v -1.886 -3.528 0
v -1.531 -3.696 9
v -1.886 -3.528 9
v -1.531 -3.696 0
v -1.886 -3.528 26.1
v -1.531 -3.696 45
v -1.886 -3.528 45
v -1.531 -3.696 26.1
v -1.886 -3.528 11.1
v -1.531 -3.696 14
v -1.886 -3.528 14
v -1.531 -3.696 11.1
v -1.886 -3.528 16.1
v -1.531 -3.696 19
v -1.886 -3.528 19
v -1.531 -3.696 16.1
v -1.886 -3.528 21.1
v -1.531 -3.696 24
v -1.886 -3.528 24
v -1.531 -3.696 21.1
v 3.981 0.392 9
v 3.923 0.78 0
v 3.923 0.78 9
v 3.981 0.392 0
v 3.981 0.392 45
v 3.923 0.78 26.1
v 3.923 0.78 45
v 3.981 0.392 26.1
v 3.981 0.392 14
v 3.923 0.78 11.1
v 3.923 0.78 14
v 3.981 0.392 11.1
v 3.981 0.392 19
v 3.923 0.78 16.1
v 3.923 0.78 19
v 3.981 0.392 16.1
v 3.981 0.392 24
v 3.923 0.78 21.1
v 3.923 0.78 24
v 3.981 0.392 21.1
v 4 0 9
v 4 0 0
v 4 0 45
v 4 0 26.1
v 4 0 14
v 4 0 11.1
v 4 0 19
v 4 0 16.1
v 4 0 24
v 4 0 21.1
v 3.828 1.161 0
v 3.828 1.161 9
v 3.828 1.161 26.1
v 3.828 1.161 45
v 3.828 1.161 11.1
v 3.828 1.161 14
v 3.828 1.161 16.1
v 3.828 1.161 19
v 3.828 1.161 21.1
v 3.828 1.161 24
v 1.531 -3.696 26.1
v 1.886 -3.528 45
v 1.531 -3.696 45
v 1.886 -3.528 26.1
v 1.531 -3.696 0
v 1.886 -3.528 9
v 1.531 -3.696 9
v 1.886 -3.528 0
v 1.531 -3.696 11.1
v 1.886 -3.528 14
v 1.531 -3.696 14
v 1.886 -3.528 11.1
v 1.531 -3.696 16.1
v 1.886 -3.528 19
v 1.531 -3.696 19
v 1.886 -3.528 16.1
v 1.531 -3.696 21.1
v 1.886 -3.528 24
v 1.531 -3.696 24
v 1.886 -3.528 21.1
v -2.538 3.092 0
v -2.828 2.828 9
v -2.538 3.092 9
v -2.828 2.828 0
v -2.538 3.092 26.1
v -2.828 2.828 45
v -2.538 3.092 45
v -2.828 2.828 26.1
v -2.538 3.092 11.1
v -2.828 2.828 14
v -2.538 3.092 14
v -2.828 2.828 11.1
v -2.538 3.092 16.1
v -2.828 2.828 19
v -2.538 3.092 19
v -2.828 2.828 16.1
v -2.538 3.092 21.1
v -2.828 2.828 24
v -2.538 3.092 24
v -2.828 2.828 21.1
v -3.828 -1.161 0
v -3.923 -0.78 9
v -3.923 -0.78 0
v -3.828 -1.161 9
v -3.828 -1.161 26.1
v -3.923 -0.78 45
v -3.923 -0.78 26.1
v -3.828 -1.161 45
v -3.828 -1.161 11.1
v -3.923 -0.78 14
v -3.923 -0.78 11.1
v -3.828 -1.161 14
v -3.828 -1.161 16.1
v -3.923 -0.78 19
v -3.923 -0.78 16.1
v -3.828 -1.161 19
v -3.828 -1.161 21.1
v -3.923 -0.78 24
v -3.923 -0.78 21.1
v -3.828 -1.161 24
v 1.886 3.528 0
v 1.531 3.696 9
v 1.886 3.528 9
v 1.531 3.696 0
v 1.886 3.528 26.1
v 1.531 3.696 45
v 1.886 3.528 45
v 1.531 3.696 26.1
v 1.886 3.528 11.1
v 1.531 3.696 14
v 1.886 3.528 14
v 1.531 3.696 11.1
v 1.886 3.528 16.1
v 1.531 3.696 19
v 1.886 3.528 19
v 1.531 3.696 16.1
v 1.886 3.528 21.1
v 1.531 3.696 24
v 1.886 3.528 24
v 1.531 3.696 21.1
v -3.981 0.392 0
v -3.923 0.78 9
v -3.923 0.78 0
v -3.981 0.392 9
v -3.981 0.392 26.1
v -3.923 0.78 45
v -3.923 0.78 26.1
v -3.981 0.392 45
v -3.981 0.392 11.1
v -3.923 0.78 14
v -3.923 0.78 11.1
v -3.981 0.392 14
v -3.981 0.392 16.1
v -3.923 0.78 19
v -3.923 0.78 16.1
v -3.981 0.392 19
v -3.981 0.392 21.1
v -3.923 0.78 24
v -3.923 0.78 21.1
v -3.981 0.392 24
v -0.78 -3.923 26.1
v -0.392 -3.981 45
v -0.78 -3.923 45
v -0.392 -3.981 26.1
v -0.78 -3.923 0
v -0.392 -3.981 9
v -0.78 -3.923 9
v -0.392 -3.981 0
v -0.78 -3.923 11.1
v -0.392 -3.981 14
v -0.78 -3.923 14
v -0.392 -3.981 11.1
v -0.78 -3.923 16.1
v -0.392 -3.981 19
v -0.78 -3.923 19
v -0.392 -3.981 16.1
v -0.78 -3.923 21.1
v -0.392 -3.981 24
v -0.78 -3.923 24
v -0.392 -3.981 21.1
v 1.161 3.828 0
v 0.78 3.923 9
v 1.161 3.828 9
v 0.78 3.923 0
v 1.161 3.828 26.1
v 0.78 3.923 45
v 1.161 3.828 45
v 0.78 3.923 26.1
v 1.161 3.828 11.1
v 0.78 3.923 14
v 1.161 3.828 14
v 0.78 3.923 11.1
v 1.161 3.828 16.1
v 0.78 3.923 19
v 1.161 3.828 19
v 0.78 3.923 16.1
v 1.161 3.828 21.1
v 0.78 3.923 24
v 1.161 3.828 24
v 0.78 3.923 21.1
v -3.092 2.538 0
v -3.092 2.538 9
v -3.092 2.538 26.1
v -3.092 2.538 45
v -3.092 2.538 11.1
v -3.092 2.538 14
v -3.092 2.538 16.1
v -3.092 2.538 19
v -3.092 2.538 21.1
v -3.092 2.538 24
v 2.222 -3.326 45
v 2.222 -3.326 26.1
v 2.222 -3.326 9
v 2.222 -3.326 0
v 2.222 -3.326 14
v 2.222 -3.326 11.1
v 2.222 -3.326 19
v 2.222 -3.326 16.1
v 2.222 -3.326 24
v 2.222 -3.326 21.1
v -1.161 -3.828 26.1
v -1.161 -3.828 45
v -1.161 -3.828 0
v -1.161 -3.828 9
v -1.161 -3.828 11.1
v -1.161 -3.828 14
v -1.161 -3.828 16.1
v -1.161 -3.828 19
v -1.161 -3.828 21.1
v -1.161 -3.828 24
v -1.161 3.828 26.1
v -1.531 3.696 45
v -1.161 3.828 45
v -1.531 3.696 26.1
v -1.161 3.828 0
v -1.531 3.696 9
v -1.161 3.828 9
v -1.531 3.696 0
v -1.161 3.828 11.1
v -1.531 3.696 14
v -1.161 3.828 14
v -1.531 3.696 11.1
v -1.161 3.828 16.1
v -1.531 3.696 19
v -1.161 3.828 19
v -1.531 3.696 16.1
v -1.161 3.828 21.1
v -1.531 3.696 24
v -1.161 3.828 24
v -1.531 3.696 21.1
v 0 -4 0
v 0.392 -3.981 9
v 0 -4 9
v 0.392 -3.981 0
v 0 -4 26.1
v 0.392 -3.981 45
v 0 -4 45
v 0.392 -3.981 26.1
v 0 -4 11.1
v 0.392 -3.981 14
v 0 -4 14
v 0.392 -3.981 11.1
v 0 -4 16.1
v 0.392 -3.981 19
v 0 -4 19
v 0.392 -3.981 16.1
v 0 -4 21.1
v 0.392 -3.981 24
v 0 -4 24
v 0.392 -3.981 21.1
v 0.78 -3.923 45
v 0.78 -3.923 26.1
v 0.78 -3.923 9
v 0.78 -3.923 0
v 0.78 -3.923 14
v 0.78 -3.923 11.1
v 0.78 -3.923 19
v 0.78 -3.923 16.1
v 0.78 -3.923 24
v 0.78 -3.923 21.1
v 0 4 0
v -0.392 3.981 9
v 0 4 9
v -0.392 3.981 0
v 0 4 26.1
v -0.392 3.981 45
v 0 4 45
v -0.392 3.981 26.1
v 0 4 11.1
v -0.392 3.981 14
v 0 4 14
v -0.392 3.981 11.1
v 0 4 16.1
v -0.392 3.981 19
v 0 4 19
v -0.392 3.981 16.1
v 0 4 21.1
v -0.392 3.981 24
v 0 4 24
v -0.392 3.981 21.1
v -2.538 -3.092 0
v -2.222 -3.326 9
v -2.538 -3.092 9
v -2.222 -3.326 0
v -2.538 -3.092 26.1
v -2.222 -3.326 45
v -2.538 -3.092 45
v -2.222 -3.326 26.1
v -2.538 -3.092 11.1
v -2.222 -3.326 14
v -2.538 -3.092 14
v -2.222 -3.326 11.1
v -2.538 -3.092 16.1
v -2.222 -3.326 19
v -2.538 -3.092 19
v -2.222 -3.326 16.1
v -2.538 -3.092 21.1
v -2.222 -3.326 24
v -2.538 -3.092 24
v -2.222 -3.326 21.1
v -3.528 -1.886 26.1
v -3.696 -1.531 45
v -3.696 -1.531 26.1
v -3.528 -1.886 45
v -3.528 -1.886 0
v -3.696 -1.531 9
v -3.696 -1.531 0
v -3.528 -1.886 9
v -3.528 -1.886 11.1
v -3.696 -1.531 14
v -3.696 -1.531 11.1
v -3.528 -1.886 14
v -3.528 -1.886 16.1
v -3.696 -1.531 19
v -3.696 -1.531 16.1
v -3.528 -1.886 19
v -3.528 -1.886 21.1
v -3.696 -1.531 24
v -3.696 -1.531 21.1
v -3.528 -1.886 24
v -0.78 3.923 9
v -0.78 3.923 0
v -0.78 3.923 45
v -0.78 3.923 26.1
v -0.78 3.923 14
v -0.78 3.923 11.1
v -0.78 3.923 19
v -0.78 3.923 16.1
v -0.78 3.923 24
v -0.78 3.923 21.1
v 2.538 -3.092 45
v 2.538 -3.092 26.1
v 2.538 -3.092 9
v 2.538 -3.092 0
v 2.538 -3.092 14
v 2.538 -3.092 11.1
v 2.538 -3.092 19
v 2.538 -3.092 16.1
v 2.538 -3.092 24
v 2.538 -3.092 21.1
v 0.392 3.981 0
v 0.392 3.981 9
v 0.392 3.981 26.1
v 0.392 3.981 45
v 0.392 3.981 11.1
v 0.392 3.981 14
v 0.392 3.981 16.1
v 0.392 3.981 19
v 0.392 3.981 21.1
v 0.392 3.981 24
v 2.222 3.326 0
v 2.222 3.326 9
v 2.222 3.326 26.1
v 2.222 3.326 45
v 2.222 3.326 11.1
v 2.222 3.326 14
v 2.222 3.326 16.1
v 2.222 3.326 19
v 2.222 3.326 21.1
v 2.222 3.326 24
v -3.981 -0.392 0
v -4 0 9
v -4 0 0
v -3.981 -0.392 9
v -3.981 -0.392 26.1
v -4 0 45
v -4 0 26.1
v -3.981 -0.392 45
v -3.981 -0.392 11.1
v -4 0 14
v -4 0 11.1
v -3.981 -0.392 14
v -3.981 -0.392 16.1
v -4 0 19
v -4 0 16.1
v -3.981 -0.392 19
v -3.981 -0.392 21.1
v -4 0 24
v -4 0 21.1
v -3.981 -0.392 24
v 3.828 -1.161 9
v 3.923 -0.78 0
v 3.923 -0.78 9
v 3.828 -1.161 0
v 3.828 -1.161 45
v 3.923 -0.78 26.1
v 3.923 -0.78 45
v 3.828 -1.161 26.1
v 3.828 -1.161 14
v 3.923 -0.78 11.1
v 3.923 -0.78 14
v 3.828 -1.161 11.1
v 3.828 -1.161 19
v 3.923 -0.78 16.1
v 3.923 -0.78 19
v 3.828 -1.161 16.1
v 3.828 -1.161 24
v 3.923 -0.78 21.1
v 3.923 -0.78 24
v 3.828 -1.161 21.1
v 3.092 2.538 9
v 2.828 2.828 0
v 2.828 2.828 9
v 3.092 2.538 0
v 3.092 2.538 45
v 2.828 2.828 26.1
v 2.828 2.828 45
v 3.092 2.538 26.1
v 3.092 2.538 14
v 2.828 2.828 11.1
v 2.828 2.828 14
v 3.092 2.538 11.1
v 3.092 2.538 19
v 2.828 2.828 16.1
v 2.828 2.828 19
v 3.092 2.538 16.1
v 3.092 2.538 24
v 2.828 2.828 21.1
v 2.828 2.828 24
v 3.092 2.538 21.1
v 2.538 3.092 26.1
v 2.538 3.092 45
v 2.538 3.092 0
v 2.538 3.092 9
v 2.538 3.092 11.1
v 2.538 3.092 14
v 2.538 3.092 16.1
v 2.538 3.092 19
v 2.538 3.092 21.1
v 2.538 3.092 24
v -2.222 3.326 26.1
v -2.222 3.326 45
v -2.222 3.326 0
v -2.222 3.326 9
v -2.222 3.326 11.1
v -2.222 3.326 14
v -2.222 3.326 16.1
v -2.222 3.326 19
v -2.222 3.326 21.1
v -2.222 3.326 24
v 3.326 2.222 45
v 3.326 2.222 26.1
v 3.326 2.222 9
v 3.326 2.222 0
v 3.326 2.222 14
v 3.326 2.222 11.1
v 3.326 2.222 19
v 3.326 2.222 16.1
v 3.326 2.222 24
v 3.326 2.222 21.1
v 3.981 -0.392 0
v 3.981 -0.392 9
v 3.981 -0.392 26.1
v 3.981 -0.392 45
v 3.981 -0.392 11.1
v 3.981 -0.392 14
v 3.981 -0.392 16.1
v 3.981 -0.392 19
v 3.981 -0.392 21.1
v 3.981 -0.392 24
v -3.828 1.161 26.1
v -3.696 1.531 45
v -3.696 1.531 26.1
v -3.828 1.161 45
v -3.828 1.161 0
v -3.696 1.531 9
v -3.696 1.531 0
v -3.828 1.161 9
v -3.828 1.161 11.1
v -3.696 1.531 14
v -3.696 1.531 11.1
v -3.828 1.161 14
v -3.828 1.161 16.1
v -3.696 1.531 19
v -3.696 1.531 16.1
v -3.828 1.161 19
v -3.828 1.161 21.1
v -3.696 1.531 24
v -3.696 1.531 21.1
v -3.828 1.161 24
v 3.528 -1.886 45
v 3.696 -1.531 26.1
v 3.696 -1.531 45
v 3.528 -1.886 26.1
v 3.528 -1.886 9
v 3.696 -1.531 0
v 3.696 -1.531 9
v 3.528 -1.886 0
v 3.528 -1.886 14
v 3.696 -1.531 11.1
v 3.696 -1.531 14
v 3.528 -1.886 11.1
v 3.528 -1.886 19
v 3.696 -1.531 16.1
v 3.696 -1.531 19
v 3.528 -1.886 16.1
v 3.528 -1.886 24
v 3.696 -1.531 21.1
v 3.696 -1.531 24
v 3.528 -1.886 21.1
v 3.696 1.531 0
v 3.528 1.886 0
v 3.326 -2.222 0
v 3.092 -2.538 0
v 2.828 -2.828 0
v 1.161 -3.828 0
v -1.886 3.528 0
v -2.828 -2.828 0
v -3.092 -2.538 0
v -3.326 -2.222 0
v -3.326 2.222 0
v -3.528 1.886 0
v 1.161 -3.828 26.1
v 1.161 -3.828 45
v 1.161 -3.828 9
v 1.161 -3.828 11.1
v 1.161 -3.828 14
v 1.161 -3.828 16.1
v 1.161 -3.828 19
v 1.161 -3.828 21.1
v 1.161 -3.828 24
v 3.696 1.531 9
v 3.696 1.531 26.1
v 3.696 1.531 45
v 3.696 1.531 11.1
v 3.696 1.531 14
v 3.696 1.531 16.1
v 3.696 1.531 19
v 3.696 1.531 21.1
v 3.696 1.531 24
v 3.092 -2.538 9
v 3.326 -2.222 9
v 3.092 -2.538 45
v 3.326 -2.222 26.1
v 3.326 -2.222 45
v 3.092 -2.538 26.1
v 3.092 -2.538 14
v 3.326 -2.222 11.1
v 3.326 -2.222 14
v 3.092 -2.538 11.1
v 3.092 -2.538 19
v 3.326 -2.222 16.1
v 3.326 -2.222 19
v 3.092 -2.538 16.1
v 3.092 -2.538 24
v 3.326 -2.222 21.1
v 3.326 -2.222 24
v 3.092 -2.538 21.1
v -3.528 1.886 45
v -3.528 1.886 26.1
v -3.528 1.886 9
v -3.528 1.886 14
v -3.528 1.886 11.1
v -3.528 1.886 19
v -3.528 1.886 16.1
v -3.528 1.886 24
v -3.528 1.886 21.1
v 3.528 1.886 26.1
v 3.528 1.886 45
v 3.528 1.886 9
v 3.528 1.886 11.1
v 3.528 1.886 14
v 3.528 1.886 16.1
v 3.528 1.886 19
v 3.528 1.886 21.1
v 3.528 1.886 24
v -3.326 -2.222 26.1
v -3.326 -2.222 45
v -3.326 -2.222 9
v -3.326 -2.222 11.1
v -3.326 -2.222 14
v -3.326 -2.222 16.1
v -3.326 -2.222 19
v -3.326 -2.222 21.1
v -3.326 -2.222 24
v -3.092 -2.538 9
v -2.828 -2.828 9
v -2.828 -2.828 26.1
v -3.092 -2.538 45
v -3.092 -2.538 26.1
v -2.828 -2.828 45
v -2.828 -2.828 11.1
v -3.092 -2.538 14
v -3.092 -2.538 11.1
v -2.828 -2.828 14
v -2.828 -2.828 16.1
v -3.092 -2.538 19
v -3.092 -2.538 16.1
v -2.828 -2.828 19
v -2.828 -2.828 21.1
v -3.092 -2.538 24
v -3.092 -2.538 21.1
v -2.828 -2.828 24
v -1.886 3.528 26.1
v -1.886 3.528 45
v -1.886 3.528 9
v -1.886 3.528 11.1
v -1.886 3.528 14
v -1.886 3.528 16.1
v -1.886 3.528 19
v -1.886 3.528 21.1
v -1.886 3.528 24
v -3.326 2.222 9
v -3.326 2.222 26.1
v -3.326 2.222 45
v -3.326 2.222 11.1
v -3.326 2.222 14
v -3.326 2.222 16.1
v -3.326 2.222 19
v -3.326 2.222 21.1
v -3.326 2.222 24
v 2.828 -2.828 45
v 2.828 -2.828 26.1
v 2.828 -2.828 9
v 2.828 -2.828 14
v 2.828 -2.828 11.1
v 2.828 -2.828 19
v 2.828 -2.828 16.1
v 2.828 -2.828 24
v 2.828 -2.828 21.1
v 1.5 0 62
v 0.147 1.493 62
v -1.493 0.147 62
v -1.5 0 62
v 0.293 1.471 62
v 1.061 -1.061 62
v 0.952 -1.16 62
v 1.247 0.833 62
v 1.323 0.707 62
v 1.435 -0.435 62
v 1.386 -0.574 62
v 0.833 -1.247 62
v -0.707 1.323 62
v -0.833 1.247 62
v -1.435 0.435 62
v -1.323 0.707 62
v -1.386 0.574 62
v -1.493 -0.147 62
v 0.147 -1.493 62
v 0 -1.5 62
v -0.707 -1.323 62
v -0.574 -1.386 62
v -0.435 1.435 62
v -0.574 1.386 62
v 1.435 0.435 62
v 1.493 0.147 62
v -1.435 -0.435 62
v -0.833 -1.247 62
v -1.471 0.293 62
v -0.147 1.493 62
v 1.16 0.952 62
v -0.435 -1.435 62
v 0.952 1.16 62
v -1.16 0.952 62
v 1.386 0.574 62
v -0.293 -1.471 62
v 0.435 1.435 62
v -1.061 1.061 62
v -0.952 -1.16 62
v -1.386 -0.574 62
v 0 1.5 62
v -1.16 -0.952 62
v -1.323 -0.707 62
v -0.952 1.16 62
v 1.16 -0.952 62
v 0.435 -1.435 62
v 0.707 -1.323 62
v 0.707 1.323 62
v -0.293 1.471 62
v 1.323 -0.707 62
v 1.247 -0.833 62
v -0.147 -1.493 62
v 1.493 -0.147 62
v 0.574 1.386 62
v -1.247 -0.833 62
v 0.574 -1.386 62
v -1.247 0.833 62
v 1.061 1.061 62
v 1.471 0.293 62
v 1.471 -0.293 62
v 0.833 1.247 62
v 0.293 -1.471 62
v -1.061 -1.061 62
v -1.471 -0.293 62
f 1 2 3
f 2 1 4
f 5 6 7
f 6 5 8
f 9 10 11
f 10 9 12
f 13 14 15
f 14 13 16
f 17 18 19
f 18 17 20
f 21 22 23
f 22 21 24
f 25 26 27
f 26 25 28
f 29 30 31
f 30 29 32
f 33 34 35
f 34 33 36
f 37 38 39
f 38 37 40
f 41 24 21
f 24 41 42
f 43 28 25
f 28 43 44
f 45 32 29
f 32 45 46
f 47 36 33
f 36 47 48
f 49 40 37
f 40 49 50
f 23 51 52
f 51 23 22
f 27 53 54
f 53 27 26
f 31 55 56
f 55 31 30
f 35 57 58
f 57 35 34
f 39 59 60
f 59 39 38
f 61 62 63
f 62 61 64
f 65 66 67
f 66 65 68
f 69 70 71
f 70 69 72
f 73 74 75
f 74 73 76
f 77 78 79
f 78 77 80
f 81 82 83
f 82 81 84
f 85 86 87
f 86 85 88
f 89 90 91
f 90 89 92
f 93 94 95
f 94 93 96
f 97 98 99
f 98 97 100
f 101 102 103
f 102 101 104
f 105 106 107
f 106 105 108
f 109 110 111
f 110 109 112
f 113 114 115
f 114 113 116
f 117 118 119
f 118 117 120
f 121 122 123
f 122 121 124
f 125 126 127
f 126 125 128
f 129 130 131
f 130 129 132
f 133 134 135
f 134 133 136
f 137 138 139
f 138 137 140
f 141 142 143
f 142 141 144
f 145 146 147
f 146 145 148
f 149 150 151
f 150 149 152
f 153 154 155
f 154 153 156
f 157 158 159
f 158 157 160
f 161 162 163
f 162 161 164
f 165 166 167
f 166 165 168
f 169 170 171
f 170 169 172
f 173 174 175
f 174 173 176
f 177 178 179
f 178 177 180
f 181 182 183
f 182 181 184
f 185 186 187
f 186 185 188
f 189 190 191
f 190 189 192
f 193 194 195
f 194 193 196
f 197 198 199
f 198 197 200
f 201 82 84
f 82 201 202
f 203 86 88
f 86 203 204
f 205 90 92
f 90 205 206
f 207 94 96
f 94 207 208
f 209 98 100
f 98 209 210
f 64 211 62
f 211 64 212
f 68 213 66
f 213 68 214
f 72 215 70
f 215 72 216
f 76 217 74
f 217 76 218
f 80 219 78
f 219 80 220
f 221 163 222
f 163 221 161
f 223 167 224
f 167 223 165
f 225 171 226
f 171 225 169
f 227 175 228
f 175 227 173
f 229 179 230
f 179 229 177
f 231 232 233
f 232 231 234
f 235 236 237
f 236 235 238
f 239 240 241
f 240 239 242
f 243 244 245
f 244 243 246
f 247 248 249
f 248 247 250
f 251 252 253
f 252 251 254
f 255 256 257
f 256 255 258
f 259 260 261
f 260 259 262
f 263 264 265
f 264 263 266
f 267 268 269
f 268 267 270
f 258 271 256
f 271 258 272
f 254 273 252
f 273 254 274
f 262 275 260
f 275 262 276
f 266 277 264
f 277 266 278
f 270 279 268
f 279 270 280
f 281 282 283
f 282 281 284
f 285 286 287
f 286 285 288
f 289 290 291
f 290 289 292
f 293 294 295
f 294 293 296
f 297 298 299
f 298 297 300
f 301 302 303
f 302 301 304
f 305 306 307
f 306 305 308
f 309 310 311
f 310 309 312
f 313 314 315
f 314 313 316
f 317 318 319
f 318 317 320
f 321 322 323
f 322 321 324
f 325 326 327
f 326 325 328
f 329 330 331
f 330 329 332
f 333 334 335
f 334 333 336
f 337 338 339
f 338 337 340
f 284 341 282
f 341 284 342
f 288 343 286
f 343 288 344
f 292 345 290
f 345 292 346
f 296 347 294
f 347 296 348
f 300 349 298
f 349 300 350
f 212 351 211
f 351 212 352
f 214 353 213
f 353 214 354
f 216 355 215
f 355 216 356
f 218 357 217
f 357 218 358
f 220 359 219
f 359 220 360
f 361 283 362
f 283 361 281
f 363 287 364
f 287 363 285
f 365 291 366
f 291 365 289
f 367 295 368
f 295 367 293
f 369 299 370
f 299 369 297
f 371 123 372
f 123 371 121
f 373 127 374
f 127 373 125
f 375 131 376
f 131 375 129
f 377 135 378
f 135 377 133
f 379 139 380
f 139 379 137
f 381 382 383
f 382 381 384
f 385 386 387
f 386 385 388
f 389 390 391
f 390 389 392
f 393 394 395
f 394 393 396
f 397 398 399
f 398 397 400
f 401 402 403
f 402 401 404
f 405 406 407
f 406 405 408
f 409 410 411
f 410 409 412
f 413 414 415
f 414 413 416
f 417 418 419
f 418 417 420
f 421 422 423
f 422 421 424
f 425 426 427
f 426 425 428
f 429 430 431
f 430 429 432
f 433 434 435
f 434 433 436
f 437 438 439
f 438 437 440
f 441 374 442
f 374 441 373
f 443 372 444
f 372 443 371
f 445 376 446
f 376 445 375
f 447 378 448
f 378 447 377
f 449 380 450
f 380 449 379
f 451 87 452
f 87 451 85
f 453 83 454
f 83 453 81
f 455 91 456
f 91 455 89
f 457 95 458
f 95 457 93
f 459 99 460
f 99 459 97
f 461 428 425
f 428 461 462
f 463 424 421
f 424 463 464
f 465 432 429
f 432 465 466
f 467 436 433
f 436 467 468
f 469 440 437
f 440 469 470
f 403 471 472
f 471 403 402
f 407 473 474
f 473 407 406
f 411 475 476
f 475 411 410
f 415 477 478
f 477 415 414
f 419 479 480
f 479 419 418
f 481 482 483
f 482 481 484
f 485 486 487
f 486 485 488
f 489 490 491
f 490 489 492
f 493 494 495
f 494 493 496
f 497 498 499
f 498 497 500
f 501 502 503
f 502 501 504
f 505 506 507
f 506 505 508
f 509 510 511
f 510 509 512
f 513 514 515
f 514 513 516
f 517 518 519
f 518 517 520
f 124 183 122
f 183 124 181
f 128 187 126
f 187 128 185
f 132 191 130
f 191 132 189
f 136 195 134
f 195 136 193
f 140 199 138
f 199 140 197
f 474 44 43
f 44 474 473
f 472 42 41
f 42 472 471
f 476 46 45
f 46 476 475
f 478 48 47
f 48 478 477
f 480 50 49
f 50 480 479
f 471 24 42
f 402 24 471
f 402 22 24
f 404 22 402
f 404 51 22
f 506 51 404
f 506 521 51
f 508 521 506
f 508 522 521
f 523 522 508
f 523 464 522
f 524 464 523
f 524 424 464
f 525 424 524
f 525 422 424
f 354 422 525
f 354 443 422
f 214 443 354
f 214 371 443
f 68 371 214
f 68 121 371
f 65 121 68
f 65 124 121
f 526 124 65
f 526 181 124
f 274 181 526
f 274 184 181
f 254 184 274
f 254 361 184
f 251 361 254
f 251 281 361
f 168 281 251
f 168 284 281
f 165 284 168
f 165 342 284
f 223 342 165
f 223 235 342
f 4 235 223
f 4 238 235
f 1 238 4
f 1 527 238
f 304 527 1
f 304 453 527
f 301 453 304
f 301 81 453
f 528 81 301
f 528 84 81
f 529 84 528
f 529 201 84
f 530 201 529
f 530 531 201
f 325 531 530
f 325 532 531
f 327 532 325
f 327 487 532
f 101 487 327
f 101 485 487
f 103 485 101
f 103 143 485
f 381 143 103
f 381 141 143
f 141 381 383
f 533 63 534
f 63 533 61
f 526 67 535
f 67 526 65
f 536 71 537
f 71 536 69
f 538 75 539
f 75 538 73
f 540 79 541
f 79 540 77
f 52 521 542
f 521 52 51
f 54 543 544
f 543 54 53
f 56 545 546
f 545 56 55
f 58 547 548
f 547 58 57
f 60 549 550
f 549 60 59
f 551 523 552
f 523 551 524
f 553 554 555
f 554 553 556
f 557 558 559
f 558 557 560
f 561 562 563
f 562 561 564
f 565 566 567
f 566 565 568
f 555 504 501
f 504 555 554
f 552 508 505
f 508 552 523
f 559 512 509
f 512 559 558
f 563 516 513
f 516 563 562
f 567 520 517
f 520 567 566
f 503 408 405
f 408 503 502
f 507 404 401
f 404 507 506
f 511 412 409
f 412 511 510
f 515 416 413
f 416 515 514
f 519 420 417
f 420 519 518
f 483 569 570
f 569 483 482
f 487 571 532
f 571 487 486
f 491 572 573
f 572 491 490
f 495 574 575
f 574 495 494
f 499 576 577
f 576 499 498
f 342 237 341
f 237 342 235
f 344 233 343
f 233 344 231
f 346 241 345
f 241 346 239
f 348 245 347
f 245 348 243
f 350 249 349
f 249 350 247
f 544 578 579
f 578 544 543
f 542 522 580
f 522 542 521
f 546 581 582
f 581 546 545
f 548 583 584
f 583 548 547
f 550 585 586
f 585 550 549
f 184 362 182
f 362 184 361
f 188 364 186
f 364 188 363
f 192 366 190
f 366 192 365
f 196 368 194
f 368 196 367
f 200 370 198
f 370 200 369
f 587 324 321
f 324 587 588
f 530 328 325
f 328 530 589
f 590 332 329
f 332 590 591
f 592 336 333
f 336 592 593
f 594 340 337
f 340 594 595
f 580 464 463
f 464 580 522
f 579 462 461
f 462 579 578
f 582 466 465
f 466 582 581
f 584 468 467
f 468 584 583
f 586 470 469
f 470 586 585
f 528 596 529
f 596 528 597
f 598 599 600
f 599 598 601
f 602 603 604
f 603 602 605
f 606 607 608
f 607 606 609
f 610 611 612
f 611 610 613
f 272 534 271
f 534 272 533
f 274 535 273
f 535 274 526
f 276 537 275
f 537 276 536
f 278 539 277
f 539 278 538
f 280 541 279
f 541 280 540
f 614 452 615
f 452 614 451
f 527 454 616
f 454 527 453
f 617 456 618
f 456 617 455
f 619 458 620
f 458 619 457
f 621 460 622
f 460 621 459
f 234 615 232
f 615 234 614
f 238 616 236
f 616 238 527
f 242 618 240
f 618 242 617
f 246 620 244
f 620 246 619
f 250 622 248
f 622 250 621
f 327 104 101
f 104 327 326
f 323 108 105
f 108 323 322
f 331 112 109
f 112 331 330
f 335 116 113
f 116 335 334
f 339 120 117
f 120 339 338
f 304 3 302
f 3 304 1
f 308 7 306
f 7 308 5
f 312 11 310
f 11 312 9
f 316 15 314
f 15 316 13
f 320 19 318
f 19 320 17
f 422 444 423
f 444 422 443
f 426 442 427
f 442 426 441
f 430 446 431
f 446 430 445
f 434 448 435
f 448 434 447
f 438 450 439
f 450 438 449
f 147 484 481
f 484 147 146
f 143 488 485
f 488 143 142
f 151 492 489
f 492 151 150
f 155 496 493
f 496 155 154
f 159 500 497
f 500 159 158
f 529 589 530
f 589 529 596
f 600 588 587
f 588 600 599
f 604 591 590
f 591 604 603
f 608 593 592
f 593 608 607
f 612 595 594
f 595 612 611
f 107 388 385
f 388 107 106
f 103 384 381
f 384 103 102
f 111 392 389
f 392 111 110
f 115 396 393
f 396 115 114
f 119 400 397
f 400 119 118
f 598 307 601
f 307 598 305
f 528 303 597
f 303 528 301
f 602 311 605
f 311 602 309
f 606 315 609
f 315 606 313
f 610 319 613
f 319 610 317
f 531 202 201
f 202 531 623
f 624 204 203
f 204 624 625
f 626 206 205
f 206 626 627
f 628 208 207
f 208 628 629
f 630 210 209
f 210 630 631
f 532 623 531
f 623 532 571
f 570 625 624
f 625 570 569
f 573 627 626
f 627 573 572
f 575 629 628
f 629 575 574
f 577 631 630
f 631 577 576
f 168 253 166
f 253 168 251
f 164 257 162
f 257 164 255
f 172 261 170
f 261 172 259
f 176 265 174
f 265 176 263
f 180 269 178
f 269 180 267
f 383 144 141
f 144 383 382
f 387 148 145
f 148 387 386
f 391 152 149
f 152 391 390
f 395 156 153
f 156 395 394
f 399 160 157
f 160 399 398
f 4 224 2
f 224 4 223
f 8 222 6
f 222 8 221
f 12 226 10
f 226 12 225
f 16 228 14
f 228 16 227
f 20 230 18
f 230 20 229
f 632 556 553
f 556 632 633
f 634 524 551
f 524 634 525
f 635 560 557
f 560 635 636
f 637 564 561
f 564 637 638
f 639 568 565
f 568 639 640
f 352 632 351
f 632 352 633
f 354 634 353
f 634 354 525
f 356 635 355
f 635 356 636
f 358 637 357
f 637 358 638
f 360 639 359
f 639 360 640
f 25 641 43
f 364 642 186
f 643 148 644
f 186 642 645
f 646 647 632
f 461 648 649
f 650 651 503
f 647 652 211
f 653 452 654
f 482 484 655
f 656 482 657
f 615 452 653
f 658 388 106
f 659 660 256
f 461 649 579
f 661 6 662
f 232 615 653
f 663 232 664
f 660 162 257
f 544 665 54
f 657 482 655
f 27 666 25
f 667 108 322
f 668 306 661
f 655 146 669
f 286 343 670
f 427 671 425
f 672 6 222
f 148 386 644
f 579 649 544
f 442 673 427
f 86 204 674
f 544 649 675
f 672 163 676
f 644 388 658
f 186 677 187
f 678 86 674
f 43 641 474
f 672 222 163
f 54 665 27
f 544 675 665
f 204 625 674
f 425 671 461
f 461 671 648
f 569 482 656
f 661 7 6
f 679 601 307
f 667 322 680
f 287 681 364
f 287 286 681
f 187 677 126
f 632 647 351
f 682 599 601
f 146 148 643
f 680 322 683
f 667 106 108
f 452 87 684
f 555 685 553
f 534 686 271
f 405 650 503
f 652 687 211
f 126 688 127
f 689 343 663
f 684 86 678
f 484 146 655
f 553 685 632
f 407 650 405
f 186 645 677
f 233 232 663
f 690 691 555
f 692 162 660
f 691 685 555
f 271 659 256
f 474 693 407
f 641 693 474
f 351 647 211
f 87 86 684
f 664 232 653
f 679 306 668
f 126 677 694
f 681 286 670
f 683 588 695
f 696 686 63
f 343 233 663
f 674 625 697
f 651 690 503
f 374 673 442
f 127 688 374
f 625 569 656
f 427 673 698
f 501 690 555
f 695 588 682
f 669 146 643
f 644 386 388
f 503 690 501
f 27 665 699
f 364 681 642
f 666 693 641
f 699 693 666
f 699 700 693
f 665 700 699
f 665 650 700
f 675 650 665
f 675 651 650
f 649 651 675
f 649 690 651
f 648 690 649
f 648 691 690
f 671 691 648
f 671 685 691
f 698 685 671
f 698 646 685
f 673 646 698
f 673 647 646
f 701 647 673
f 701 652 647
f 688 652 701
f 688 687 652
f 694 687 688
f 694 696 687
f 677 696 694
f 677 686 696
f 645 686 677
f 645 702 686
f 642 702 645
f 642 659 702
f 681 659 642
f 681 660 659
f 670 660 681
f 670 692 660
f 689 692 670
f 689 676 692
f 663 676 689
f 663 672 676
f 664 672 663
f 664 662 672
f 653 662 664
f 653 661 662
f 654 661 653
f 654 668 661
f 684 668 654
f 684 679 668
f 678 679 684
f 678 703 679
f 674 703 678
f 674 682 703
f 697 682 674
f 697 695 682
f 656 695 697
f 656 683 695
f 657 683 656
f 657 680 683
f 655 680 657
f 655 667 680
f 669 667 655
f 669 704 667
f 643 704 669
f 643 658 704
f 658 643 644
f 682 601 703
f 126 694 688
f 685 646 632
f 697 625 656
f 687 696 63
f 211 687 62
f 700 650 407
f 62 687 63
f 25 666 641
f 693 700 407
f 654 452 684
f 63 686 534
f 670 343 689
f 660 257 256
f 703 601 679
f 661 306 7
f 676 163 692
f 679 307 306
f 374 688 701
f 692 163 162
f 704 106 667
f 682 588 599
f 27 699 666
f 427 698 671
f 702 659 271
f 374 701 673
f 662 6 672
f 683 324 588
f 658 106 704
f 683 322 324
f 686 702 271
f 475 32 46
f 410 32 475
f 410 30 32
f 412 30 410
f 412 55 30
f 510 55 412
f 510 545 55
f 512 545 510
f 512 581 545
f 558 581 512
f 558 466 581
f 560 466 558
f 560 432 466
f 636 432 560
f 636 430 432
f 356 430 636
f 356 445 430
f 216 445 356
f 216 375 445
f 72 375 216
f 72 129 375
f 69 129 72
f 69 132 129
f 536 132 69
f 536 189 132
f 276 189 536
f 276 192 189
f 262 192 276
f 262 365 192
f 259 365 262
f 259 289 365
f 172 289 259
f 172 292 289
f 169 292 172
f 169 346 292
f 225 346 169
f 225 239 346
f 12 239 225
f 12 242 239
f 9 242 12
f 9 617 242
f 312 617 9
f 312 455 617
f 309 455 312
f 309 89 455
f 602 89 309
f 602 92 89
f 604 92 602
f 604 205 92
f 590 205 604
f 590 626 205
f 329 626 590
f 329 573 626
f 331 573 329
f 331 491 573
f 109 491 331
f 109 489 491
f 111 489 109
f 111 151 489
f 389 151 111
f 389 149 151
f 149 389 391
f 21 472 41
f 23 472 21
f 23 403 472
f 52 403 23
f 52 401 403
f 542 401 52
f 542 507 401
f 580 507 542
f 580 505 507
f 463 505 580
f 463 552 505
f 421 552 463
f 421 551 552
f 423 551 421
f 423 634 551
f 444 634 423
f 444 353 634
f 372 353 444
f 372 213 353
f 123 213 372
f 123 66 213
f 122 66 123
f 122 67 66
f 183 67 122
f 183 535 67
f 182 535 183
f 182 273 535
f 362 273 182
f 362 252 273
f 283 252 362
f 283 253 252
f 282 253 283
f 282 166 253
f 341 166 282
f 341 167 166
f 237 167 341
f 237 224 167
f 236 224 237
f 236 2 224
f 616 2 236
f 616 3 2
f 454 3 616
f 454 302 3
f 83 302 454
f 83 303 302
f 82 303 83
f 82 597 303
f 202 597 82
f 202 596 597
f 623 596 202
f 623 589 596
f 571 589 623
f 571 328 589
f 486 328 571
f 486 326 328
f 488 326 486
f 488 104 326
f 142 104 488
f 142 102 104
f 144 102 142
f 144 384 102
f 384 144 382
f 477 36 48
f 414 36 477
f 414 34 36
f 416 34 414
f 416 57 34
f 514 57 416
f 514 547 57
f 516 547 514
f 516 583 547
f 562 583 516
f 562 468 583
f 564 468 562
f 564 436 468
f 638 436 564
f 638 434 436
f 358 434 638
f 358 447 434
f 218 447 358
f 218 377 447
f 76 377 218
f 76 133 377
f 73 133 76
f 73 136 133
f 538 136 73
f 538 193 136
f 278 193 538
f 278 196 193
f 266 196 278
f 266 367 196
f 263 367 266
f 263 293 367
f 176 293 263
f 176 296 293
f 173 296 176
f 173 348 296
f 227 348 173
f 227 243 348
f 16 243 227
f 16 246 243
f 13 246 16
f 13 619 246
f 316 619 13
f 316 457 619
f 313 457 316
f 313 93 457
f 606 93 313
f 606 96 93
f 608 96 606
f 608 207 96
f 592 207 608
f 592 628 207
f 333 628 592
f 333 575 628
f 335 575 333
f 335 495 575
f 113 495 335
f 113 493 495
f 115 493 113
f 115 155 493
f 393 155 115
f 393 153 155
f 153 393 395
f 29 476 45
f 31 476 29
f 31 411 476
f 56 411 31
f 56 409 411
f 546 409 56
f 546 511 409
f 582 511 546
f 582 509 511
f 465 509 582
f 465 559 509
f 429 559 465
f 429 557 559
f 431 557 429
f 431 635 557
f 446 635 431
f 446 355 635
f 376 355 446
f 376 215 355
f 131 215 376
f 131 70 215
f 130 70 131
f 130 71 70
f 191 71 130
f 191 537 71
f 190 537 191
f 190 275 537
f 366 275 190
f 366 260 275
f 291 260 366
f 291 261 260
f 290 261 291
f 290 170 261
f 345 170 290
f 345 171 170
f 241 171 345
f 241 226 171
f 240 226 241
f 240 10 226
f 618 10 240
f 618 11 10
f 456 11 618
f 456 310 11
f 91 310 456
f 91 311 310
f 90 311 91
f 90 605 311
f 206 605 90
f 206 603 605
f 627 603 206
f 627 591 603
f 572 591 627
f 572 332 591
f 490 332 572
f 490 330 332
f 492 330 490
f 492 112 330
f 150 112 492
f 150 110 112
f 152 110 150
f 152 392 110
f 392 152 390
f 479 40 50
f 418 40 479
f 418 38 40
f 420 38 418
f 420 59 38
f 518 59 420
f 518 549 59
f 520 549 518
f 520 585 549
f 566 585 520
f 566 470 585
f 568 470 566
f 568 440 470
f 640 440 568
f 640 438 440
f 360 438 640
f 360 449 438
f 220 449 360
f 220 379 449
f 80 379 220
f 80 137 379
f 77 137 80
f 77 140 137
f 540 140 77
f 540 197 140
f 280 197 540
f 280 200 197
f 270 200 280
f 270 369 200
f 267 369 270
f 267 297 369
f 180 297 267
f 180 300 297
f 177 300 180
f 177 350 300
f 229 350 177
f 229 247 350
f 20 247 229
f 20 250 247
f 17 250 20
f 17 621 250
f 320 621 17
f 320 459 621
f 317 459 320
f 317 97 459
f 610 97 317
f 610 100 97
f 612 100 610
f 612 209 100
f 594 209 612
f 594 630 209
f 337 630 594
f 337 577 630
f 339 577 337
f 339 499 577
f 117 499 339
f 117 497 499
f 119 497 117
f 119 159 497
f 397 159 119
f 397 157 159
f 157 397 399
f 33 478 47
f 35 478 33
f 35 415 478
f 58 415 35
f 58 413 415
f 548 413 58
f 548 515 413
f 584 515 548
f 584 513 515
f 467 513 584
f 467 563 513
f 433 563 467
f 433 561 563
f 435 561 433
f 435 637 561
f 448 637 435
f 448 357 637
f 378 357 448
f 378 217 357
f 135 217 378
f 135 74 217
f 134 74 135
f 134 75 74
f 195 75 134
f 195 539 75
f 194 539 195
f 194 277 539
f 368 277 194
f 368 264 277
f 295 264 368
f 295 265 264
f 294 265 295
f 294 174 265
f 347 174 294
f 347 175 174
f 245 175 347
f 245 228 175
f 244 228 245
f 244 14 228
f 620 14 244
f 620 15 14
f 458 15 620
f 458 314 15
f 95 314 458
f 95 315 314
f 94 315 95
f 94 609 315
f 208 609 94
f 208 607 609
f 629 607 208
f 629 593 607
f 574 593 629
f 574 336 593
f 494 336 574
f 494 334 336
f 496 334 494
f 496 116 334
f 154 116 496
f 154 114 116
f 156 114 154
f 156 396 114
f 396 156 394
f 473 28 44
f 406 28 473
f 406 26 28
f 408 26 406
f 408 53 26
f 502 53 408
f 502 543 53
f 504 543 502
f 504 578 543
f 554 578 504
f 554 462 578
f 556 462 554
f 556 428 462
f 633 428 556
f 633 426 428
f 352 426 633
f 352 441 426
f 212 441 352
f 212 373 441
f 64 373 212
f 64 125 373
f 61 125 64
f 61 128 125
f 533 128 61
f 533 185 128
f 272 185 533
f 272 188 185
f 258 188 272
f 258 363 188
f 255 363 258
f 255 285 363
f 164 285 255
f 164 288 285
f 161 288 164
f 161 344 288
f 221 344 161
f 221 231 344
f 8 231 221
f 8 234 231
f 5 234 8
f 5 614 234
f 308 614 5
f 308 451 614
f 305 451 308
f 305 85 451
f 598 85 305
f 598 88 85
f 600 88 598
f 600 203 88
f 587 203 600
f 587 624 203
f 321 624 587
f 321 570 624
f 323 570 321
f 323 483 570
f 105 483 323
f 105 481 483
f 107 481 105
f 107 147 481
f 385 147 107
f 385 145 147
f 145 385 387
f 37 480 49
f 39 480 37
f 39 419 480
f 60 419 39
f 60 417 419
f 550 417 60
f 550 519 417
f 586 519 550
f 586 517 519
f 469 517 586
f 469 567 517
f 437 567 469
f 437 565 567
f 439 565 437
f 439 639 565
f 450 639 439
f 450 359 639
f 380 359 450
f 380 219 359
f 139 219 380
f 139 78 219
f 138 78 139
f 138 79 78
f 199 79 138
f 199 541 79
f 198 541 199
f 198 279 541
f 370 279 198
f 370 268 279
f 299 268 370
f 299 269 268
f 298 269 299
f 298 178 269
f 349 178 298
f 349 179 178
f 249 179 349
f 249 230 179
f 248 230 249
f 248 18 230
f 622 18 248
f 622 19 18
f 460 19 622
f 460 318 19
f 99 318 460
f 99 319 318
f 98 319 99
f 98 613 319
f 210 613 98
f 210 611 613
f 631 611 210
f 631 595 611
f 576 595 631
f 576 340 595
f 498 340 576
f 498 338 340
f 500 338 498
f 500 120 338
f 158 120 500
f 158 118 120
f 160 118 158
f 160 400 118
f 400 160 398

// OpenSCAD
// Pestle for 1.5 mL microcentrifuge tube - standing upright on XY plane.
// Dimensions in mm.

// Handle
handle_d = 8;
handle_z_start = 0;
handle_z_end = 45;

// Cone
cone_z_start = 45;
cone_z_end = 62;
cone_d_top = 8;
cone_d_bot = 3;

// Tip
tip_d = 3;
tip_z_center = 62;

// Grooves
num_grooves = 4;
groove_w = 2;   // width in Z
groove_d = 1;   // depth
groove_zs = [10, 15, 20, 25]; // centers of grooves

$fn = 64;

// Main body: Handle + Cone + Tip
difference() {
    union() {
        // 1. Cylindrical Handle
        translate([0, 0, handle_z_start])
            cylinder(h = handle_z_end - handle_z_start, d = handle_d);

        // 2. Cone (tapering from top of handle to tip base)
        translate([0, 0, cone_z_start])
            cylinder(h = cone_z_end - cone_z_start, d1 = cone_d_top, d2 = cone_d_bot);

        // 3. Rounded Tip (Sphere centered at tip_z_center)
        translate([0, 0, tip_z_center - tip_d / 2])
            sphere(d = tip_d);
    }

    // 4. Grooves (cut into the handle)
    // We cut a cylinder through the handle at each specified Z center.
    // The cut cylinder must extend slightly past the handle in Z to ensure clean cuts.
    for (z = groove_zs) {
        translate([0, 0, z - groove_w / 2])
            cylinder(h = groove_w + 0.1, d = handle_d + groove_d + 0.1);
    }
}
